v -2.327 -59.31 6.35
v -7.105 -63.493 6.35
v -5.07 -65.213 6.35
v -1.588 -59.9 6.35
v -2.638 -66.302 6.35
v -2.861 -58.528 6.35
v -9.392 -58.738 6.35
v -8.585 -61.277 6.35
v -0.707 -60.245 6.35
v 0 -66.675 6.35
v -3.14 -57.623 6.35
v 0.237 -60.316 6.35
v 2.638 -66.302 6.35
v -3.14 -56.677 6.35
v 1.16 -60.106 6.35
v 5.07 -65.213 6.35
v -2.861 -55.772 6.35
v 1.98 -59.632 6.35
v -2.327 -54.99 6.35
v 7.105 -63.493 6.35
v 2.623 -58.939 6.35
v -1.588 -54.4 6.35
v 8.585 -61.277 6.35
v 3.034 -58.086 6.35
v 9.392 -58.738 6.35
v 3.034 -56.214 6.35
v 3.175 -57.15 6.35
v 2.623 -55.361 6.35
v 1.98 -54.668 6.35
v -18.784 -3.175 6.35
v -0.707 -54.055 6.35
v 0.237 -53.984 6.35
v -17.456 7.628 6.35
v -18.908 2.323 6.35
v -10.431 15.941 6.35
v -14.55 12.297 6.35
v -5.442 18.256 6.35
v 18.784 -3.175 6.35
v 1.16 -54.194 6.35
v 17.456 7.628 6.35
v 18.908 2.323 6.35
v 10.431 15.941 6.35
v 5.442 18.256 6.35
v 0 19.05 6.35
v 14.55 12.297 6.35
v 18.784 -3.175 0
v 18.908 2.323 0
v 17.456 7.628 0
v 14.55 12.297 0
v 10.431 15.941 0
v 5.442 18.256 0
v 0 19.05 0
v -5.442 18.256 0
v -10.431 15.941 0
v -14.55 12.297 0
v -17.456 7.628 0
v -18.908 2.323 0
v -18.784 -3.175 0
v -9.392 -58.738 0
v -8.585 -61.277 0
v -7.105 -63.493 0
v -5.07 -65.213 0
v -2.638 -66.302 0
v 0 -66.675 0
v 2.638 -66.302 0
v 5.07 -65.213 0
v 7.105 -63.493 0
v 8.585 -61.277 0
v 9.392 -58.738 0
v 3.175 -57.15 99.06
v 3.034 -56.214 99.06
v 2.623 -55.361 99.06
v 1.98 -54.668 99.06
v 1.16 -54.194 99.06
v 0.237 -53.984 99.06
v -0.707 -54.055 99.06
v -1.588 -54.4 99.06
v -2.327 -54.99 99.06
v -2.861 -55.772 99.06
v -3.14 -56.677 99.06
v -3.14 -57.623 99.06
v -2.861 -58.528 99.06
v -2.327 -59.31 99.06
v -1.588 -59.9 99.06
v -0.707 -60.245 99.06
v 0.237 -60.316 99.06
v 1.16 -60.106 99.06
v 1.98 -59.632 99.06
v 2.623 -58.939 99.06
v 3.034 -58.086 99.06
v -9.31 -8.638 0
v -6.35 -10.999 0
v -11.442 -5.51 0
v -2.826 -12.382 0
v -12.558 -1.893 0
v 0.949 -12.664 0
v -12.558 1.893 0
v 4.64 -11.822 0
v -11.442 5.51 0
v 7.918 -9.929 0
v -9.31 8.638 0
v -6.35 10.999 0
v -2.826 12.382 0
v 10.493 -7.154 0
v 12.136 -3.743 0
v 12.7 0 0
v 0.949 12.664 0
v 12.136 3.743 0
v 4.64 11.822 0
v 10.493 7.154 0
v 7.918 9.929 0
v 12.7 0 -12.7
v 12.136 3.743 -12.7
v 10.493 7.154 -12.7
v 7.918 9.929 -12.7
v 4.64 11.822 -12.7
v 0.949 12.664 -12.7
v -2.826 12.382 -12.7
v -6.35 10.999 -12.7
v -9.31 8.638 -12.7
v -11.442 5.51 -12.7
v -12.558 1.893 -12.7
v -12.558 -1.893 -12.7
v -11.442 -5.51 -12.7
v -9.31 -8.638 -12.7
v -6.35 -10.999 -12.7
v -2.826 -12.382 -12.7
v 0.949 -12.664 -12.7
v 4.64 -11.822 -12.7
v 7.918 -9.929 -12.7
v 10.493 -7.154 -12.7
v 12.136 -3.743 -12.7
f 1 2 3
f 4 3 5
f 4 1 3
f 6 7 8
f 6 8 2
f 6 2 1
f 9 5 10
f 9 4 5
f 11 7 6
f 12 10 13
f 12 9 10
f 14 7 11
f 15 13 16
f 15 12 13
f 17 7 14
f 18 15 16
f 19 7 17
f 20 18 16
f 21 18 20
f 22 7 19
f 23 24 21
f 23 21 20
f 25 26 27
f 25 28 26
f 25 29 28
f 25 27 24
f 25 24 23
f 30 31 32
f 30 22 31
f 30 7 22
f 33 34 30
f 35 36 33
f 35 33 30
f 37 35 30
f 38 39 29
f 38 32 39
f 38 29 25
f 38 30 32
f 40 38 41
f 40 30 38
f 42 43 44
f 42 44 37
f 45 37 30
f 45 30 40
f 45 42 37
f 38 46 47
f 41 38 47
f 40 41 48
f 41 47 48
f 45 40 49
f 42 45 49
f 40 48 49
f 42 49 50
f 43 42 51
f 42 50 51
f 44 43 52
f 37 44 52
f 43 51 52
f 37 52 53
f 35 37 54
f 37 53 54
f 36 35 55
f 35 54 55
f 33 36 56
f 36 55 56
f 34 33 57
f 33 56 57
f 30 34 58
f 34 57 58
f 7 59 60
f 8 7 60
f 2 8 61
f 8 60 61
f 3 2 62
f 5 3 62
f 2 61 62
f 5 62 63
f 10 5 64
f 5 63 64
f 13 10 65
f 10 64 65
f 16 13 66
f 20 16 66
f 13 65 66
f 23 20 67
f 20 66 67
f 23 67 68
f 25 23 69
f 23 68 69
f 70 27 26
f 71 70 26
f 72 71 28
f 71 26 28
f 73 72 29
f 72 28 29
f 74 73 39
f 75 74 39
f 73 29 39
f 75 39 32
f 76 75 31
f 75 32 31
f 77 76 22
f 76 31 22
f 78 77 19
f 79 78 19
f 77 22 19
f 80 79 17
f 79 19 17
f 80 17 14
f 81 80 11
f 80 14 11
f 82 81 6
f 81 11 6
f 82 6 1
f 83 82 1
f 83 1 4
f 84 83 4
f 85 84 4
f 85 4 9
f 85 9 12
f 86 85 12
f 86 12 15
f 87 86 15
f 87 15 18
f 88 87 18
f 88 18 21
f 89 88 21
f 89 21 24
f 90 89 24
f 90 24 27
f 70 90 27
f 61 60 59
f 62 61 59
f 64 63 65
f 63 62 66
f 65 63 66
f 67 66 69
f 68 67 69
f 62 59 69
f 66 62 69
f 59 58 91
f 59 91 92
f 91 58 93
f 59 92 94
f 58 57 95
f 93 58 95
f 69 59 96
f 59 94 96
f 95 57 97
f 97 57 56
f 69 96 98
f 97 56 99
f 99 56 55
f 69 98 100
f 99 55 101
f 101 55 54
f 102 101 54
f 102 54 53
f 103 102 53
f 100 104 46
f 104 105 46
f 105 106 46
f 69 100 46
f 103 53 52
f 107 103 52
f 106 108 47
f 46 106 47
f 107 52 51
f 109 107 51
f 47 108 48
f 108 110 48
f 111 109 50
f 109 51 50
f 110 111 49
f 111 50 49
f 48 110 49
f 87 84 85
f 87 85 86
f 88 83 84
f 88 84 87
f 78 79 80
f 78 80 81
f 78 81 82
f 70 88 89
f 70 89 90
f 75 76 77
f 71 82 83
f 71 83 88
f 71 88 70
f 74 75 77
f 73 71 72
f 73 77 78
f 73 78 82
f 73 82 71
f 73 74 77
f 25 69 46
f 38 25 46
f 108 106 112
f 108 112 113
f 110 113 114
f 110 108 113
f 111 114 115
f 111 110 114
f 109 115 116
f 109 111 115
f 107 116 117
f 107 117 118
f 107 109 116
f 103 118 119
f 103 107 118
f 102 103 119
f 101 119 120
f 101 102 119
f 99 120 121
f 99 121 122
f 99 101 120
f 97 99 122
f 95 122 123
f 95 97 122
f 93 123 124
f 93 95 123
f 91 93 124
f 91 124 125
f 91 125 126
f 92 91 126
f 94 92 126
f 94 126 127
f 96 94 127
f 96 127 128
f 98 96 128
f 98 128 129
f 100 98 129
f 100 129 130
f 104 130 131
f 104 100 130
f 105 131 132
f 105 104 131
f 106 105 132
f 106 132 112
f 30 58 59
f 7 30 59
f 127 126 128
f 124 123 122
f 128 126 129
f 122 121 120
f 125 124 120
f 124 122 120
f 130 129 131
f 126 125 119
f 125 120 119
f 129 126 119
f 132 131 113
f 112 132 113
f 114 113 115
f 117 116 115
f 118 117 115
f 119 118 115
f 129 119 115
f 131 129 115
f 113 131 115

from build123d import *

# Parameters (mm, degrees)
SKETCH1_R           = 12.7
BOSS_EXTRUDE1_DEPTH = 12.7
SKETCH1_3_R         = 3.175
BOSS_EXTRUDE2_DEPTH = 6.35
SKETCH1_4_R         = 3.175
BOSS_EXTRUDE3_DEPTH = 99.06


with BuildPart() as part:
    # Sketch1 → Boss-Extrude1 (new body)
    with BuildSketch(Plane.XY):
        Circle(SKETCH1_R)
    extrude(amount=-BOSS_EXTRUDE1_DEPTH)

    # Sketch1<3> → Boss-Extrude2 (add)
    with BuildSketch(Plane.XY):
        with BuildLine():
            Line((9.391776656, -58.7375), (18.783553311, -3.175))
            ThreePointArc((18.783553311, -3.175), (0, 19.05), (-18.783553311, -3.175))
            Line((-18.783553311, -3.175), (-9.391776656, -58.7375))
            ThreePointArc((-9.391776656, -58.7375), (0, -66.675), (9.391776656, -58.7375))
        make_face()
        with Locations((0, -57.15)):
            Circle(SKETCH1_3_R, mode=Mode.SUBTRACT)
    extrude(amount=BOSS_EXTRUDE2_DEPTH)

    # Sketch1<4> → Boss-Extrude3 (add)
    with BuildSketch(Plane.XY):
        with Locations((0, -57.15)):
            Circle(SKETCH1_4_R)
    extrude(amount=BOSS_EXTRUDE3_DEPTH)


solid = part.part
